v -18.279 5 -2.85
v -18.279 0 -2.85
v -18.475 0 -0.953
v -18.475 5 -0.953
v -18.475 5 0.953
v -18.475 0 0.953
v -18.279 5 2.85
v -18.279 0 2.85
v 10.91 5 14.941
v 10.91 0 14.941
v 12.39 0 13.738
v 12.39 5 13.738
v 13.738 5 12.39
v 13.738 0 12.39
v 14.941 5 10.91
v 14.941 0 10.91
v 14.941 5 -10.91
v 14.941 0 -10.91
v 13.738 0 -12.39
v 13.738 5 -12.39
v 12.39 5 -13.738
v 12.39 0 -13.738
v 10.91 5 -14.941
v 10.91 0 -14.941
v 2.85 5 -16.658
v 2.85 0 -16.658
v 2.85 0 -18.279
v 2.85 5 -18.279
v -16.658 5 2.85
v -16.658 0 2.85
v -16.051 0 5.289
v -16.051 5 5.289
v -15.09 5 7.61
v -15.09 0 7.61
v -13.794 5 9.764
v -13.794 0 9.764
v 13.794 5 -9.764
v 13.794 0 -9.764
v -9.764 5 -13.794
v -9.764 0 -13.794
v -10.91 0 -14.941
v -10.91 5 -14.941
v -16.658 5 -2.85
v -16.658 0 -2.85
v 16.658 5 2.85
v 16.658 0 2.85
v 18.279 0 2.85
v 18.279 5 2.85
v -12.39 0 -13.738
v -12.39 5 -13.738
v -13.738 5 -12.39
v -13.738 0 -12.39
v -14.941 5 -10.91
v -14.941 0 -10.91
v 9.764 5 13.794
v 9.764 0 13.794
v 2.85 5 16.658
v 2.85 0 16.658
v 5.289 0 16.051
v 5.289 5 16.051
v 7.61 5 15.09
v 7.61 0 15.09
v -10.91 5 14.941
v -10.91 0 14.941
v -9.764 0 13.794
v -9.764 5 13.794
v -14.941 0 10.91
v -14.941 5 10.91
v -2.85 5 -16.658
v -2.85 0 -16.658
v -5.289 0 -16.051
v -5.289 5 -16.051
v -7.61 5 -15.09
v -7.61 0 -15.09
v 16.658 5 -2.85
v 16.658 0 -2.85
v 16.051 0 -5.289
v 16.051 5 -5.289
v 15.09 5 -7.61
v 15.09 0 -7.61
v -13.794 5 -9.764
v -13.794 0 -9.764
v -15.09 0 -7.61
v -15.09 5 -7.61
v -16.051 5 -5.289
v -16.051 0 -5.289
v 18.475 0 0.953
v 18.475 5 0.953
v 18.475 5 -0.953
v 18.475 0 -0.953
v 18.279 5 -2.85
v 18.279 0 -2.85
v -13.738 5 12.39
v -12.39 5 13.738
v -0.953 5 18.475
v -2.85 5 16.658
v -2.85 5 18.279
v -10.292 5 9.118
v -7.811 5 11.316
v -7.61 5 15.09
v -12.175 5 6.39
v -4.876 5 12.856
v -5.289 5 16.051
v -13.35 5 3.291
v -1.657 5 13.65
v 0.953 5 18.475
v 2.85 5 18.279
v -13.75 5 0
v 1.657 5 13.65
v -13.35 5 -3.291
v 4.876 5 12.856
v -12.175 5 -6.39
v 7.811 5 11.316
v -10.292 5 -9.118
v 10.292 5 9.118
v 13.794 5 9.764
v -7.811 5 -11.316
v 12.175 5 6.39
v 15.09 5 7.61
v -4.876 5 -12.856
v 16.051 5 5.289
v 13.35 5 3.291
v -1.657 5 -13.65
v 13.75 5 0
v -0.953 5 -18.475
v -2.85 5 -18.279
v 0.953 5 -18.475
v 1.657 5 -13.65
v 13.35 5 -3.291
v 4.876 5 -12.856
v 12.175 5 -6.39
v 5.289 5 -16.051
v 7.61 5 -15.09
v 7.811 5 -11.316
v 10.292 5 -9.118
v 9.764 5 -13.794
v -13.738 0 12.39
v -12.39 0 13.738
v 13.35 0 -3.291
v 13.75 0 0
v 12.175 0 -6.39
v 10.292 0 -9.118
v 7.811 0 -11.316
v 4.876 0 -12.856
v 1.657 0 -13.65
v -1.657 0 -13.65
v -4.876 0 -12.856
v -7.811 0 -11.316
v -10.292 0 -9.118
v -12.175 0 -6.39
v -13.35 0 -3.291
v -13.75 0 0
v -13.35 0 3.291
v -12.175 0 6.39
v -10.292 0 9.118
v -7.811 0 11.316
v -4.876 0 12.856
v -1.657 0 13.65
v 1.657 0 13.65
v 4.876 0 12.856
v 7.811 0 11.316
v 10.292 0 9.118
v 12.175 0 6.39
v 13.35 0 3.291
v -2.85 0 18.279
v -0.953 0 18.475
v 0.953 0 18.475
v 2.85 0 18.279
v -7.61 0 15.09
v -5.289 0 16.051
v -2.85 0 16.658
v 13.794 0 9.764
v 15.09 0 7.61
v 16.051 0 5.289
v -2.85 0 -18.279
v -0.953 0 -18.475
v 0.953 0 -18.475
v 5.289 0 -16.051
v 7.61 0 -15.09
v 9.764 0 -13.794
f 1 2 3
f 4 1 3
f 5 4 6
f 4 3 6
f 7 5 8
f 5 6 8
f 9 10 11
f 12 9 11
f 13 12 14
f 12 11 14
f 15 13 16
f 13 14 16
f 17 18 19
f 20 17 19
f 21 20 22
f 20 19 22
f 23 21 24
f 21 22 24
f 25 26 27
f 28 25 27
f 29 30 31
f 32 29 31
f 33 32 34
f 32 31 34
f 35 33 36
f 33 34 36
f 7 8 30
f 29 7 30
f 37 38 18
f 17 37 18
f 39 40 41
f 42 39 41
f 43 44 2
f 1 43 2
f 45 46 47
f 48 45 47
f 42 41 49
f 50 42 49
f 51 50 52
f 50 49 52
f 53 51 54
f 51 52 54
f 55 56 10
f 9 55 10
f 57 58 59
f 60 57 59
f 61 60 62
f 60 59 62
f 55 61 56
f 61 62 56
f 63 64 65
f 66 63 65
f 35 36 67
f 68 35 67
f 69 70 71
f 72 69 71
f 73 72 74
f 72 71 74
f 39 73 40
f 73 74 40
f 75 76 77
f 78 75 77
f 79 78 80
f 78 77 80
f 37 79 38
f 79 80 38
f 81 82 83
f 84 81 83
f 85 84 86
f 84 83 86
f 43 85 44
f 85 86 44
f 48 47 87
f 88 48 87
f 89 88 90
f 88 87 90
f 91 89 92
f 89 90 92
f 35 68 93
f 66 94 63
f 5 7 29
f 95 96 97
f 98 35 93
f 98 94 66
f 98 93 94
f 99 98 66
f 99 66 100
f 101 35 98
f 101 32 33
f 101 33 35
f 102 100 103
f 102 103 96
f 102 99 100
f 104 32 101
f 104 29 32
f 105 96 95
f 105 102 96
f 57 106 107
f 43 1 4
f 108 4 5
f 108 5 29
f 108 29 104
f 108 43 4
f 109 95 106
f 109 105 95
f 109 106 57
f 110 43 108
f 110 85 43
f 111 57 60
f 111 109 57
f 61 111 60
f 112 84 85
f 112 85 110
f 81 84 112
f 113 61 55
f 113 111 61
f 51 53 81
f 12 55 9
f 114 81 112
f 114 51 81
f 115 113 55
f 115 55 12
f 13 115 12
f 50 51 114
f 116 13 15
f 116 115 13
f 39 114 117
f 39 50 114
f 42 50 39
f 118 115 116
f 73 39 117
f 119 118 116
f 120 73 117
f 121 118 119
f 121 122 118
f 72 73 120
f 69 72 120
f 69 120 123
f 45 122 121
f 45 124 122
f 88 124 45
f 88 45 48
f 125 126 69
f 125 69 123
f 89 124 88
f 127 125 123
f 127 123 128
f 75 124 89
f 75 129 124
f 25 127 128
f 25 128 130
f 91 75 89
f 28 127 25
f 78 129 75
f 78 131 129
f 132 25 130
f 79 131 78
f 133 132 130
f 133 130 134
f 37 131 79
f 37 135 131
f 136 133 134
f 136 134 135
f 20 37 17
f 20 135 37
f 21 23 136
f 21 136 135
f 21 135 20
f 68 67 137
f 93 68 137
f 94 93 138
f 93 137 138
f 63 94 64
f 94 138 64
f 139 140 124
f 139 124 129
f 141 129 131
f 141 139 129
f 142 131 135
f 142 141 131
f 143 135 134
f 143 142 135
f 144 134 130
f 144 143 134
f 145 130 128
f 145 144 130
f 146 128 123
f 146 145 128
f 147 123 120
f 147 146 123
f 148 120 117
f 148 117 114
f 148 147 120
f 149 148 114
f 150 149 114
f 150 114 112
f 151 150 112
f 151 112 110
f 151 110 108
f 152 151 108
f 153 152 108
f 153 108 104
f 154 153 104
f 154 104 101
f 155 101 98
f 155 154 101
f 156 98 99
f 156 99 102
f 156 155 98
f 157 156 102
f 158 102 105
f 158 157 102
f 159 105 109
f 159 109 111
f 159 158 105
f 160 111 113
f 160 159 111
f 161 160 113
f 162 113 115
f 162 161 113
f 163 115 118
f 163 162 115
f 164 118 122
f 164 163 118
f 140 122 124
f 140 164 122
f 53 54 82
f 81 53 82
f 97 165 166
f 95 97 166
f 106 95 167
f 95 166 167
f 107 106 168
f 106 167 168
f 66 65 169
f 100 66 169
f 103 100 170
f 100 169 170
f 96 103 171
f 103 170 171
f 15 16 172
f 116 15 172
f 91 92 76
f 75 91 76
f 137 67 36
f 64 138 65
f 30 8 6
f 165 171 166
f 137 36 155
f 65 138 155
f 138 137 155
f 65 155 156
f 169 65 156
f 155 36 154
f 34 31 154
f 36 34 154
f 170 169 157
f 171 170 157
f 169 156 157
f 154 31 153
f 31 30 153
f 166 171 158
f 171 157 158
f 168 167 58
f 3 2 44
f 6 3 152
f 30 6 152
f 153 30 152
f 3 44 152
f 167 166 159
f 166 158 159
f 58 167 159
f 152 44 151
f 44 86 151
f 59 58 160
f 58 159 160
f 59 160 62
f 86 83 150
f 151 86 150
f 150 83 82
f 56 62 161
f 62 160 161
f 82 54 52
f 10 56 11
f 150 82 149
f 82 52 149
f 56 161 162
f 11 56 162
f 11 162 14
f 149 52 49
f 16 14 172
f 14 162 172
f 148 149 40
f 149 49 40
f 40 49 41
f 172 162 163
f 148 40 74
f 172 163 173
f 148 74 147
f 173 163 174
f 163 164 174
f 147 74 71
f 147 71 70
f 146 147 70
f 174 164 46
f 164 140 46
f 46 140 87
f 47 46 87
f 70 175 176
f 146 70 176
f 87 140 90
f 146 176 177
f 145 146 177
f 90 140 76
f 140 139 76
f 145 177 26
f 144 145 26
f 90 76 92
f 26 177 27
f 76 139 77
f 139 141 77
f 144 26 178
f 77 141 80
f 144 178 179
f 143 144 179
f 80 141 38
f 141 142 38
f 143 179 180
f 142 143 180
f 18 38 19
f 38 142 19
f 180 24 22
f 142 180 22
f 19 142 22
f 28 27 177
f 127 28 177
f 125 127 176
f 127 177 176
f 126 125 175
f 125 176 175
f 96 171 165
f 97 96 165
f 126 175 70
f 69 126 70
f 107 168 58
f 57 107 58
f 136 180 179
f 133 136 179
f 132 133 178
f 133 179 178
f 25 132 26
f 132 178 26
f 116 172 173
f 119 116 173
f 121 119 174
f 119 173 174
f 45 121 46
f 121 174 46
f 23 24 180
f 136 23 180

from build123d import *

# Parameters (mm, degrees)
SKETCH_2_R      = 13.75
EXTRUDE_1_DEPTH = 5


with BuildPart() as part:
    # Эскиз2 → Бобышка-Вытянуть1 (new body)
    with BuildSketch(Plane(origin=(0, 0, 0), x_dir=(1, 0, 0), z_dir=(0, 1, 0))):
        with BuildLine():
            Line((-2.85, 18.279154794), (-2.85, 16.657956057))
            ThreePointArc((-2.85, 16.657956057), (-6.467350007, 15.613564099), (-9.763699362, 13.794208015))
            Line((-9.763699362, 13.794208015), (-10.910059983, 14.940568636))
            ThreePointArc((-10.910059983, 14.940568636), (-13.081475452, 13.081475452), (-14.940568636, 10.910059983))
            Line((-14.940568636, 10.910059983), (-13.794208015, 9.763699362))
            ThreePointArc((-13.794208015, 9.763699362), (-15.613564099, 6.467350007), (-16.657956057, 2.85))
            Line((-16.657956057, 2.85), (-18.279154794, 2.85))
            ThreePointArc((-18.279154794, 2.85), (-18.5, 0), (-18.279154794, -2.85))
            Line((-18.279154794, -2.85), (-16.657956057, -2.85))
            ThreePointArc((-16.657956057, -2.85), (-15.613564099, -6.467350007), (-13.794208015, -9.763699362))
            Line((-13.794208015, -9.763699362), (-14.940568636, -10.910059983))
            ThreePointArc((-14.940568636, -10.910059983), (-13.081475452, -13.081475452), (-10.910059983, -14.940568636))
            Line((-10.910059983, -14.940568636), (-9.763699362, -13.794208015))
            ThreePointArc((-9.763699362, -13.794208015), (-6.467350007, -15.613564099), (-2.85, -16.657956057))
            Line((-2.85, -16.657956057), (-2.85, -18.279154794))
            ThreePointArc((-2.85, -18.279154794), (0, -18.5), (2.85, -18.279154794))
            Line((2.85, -18.279154794), (2.85, -16.657956057))
            ThreePointArc((2.85, -16.657956057), (6.467350007, -15.613564099), (9.763699362, -13.794208015))
            Line((9.763699362, -13.794208015), (10.910059983, -14.940568636))
            ThreePointArc((10.910059983, -14.940568636), (13.081475452, -13.081475452), (14.940568636, -10.910059983))
            Line((14.940568636, -10.910059983), (13.794208015, -9.763699362))
            ThreePointArc((13.794208015, -9.763699362), (15.613564099, -6.467350007), (16.657956057, -2.85))
            Line((16.657956057, -2.85), (18.279154794, -2.85))
            ThreePointArc((18.279154794, -2.85), (18.5, 0), (18.279154794, 2.85))
            Line((18.279154794, 2.85), (16.657956057, 2.85))
            ThreePointArc((16.657956057, 2.85), (15.613564099, 6.467350007), (13.794208015, 9.763699362))
            Line((13.794208015, 9.763699362), (14.940568636, 10.910059983))
            ThreePointArc((14.940568636, 10.910059983), (13.081475452, 13.081475452), (10.910059983, 14.940568636))
            Line((10.910059983, 14.940568636), (9.763699362, 13.794208015))
            ThreePointArc((9.763699362, 13.794208015), (6.467350007, 15.613564099), (2.85, 16.657956057))
            Line((2.85, 16.657956057), (2.85, 18.279154794))
            ThreePointArc((2.85, 18.279154794), (0, 18.5), (-2.85, 18.279154794))
        make_face()
        Circle(SKETCH_2_R, mode=Mode.SUBTRACT)
    extrude(amount=EXTRUDE_1_DEPTH)


solid = part.part
